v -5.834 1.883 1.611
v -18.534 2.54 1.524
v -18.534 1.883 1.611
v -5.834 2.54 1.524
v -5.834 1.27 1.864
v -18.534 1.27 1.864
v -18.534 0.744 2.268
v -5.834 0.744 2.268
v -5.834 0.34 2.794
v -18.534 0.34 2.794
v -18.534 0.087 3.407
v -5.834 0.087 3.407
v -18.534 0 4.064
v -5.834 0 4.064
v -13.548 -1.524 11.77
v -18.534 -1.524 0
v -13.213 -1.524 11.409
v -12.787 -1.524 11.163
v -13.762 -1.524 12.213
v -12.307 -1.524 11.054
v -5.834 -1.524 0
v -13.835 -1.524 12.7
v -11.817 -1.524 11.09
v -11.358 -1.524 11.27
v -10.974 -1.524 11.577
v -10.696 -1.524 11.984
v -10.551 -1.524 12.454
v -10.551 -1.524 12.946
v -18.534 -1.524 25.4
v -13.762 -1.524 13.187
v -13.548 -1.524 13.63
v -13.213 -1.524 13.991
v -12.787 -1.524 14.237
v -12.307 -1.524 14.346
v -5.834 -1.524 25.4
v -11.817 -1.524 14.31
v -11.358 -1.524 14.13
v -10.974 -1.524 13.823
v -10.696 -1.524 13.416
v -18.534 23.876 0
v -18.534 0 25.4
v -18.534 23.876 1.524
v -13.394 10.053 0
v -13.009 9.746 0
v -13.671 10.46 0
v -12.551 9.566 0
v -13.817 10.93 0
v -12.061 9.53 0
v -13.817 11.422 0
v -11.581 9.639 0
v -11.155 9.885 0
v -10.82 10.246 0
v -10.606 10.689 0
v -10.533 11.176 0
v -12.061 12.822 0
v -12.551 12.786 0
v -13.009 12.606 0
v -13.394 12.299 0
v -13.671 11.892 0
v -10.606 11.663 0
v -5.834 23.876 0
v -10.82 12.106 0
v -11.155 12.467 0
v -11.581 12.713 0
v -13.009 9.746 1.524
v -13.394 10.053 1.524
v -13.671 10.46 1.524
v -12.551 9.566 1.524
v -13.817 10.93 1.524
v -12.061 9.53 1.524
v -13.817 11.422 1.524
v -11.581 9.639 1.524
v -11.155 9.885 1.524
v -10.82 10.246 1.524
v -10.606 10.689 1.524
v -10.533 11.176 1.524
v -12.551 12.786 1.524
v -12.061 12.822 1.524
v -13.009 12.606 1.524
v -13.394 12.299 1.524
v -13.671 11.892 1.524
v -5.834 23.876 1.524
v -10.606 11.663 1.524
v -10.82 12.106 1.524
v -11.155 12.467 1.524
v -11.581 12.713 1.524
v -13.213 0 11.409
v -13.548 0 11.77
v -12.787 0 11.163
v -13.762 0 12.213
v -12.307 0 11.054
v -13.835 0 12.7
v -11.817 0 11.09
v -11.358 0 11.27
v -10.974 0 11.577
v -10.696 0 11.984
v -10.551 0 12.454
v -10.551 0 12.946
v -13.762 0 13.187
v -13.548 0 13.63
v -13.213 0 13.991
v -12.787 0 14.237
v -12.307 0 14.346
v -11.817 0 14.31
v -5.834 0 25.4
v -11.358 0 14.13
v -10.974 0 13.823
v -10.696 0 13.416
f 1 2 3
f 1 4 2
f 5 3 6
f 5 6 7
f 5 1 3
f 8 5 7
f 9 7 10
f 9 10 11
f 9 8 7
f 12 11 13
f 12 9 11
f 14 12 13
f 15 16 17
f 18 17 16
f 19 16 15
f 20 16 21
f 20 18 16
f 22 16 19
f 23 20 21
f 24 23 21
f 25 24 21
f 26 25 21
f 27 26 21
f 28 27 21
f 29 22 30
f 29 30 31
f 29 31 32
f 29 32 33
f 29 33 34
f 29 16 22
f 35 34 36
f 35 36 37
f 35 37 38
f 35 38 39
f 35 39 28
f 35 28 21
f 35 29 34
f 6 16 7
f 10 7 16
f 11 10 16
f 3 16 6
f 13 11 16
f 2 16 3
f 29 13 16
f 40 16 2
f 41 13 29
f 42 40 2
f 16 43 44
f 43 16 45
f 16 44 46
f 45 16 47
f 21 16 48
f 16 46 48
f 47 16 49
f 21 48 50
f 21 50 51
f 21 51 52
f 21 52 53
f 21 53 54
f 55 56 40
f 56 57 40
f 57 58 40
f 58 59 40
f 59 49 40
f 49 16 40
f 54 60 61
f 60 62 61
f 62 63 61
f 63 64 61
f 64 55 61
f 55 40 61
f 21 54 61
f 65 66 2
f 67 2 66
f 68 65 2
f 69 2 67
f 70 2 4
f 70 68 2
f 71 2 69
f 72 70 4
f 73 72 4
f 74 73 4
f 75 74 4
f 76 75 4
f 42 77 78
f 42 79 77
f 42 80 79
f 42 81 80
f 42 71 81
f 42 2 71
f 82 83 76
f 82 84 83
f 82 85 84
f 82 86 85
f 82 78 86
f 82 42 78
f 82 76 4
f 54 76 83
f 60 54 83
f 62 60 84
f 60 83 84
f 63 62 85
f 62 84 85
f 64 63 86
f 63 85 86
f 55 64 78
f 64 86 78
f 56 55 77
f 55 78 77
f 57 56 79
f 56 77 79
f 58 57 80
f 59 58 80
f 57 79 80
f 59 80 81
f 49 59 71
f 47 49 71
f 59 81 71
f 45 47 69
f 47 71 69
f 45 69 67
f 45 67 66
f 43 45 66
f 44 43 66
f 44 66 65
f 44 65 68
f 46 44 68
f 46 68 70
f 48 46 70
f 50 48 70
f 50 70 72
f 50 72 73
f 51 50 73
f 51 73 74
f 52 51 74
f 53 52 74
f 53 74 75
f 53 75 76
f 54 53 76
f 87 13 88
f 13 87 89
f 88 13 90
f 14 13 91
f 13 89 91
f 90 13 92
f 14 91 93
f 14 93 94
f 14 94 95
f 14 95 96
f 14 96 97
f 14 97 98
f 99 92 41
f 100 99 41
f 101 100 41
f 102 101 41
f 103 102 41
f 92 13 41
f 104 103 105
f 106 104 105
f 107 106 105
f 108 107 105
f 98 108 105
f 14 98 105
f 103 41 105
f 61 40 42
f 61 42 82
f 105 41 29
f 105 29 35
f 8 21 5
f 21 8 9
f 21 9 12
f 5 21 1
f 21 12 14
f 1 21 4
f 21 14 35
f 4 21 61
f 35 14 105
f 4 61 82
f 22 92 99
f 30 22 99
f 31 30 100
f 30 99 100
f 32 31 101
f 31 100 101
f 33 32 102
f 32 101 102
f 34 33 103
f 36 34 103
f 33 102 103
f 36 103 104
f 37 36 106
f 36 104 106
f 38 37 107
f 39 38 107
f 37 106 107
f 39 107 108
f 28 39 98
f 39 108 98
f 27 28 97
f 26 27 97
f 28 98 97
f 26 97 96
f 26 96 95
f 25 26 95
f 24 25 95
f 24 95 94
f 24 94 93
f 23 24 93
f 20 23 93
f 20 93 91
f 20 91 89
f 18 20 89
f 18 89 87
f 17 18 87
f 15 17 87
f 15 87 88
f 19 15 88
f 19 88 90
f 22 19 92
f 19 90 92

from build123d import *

# Parameters (mm, degrees)
SKETCH2_W           = 12.7
SKETCH2_H           = 23.876
BOSS_EXTRUDE1_DEPTH = 1.524
SKETCH3_W           = 12.7
SKETCH3_H           = 25.4
BOSS_EXTRUDE2_DEPTH = 1.524
FILLET1_R           = 2.54
SKETCH4_R           = 1.651
CUT_EXTRUDE1_DEPTH  = 39.517993004
SKETCH5_R           = 1.651
CUT_EXTRUDE2_DEPTH  = 1.524


with BuildPart() as part:
    # Sketch2 → Boss-Extrude1 (new body)
    with BuildSketch(Plane.XY):
        with Locations((-12.183996683, 11.938)):
            Rectangle(SKETCH2_W, SKETCH2_H)
    extrude(amount=BOSS_EXTRUDE1_DEPTH)

    # Sketch3 → Boss-Extrude2 (add)
    with BuildSketch(Plane.XZ):
        with Locations((-12.183996683, 12.7)):
            Rectangle(SKETCH3_W, SKETCH3_H)
    extrude(amount=BOSS_EXTRUDE2_DEPTH)

    # Fillet1
    fillet1_edges = [part.edges().sort_by_distance(p)[0] for p in [
        (-12.183996683, 0, 1.524),
    ]]
    fillet(fillet1_edges, radius=FILLET1_R)

    # Sketch4 → Cut-Extrude1 (cut, through all)
    with BuildSketch(Plane.XY.offset(1.524)):
        with Locations((-12.183996683, 11.176)):
            Circle(SKETCH4_R)
    extrude(amount=-CUT_EXTRUDE1_DEPTH, mode=Mode.SUBTRACT)

    # Sketch5 → Cut-Extrude2 (cut)
    with BuildSketch(Plane(origin=(0, 0, 0), x_dir=(1, 0, 0), z_dir=(0, 1, 0))):
        with Locations(Location((-12.183996683, -12.7, 0), (0, 0, 180))):
            Circle(SKETCH5_R)
    extrude(amount=-CUT_EXTRUDE2_DEPTH, mode=Mode.SUBTRACT)


solid = part.part
